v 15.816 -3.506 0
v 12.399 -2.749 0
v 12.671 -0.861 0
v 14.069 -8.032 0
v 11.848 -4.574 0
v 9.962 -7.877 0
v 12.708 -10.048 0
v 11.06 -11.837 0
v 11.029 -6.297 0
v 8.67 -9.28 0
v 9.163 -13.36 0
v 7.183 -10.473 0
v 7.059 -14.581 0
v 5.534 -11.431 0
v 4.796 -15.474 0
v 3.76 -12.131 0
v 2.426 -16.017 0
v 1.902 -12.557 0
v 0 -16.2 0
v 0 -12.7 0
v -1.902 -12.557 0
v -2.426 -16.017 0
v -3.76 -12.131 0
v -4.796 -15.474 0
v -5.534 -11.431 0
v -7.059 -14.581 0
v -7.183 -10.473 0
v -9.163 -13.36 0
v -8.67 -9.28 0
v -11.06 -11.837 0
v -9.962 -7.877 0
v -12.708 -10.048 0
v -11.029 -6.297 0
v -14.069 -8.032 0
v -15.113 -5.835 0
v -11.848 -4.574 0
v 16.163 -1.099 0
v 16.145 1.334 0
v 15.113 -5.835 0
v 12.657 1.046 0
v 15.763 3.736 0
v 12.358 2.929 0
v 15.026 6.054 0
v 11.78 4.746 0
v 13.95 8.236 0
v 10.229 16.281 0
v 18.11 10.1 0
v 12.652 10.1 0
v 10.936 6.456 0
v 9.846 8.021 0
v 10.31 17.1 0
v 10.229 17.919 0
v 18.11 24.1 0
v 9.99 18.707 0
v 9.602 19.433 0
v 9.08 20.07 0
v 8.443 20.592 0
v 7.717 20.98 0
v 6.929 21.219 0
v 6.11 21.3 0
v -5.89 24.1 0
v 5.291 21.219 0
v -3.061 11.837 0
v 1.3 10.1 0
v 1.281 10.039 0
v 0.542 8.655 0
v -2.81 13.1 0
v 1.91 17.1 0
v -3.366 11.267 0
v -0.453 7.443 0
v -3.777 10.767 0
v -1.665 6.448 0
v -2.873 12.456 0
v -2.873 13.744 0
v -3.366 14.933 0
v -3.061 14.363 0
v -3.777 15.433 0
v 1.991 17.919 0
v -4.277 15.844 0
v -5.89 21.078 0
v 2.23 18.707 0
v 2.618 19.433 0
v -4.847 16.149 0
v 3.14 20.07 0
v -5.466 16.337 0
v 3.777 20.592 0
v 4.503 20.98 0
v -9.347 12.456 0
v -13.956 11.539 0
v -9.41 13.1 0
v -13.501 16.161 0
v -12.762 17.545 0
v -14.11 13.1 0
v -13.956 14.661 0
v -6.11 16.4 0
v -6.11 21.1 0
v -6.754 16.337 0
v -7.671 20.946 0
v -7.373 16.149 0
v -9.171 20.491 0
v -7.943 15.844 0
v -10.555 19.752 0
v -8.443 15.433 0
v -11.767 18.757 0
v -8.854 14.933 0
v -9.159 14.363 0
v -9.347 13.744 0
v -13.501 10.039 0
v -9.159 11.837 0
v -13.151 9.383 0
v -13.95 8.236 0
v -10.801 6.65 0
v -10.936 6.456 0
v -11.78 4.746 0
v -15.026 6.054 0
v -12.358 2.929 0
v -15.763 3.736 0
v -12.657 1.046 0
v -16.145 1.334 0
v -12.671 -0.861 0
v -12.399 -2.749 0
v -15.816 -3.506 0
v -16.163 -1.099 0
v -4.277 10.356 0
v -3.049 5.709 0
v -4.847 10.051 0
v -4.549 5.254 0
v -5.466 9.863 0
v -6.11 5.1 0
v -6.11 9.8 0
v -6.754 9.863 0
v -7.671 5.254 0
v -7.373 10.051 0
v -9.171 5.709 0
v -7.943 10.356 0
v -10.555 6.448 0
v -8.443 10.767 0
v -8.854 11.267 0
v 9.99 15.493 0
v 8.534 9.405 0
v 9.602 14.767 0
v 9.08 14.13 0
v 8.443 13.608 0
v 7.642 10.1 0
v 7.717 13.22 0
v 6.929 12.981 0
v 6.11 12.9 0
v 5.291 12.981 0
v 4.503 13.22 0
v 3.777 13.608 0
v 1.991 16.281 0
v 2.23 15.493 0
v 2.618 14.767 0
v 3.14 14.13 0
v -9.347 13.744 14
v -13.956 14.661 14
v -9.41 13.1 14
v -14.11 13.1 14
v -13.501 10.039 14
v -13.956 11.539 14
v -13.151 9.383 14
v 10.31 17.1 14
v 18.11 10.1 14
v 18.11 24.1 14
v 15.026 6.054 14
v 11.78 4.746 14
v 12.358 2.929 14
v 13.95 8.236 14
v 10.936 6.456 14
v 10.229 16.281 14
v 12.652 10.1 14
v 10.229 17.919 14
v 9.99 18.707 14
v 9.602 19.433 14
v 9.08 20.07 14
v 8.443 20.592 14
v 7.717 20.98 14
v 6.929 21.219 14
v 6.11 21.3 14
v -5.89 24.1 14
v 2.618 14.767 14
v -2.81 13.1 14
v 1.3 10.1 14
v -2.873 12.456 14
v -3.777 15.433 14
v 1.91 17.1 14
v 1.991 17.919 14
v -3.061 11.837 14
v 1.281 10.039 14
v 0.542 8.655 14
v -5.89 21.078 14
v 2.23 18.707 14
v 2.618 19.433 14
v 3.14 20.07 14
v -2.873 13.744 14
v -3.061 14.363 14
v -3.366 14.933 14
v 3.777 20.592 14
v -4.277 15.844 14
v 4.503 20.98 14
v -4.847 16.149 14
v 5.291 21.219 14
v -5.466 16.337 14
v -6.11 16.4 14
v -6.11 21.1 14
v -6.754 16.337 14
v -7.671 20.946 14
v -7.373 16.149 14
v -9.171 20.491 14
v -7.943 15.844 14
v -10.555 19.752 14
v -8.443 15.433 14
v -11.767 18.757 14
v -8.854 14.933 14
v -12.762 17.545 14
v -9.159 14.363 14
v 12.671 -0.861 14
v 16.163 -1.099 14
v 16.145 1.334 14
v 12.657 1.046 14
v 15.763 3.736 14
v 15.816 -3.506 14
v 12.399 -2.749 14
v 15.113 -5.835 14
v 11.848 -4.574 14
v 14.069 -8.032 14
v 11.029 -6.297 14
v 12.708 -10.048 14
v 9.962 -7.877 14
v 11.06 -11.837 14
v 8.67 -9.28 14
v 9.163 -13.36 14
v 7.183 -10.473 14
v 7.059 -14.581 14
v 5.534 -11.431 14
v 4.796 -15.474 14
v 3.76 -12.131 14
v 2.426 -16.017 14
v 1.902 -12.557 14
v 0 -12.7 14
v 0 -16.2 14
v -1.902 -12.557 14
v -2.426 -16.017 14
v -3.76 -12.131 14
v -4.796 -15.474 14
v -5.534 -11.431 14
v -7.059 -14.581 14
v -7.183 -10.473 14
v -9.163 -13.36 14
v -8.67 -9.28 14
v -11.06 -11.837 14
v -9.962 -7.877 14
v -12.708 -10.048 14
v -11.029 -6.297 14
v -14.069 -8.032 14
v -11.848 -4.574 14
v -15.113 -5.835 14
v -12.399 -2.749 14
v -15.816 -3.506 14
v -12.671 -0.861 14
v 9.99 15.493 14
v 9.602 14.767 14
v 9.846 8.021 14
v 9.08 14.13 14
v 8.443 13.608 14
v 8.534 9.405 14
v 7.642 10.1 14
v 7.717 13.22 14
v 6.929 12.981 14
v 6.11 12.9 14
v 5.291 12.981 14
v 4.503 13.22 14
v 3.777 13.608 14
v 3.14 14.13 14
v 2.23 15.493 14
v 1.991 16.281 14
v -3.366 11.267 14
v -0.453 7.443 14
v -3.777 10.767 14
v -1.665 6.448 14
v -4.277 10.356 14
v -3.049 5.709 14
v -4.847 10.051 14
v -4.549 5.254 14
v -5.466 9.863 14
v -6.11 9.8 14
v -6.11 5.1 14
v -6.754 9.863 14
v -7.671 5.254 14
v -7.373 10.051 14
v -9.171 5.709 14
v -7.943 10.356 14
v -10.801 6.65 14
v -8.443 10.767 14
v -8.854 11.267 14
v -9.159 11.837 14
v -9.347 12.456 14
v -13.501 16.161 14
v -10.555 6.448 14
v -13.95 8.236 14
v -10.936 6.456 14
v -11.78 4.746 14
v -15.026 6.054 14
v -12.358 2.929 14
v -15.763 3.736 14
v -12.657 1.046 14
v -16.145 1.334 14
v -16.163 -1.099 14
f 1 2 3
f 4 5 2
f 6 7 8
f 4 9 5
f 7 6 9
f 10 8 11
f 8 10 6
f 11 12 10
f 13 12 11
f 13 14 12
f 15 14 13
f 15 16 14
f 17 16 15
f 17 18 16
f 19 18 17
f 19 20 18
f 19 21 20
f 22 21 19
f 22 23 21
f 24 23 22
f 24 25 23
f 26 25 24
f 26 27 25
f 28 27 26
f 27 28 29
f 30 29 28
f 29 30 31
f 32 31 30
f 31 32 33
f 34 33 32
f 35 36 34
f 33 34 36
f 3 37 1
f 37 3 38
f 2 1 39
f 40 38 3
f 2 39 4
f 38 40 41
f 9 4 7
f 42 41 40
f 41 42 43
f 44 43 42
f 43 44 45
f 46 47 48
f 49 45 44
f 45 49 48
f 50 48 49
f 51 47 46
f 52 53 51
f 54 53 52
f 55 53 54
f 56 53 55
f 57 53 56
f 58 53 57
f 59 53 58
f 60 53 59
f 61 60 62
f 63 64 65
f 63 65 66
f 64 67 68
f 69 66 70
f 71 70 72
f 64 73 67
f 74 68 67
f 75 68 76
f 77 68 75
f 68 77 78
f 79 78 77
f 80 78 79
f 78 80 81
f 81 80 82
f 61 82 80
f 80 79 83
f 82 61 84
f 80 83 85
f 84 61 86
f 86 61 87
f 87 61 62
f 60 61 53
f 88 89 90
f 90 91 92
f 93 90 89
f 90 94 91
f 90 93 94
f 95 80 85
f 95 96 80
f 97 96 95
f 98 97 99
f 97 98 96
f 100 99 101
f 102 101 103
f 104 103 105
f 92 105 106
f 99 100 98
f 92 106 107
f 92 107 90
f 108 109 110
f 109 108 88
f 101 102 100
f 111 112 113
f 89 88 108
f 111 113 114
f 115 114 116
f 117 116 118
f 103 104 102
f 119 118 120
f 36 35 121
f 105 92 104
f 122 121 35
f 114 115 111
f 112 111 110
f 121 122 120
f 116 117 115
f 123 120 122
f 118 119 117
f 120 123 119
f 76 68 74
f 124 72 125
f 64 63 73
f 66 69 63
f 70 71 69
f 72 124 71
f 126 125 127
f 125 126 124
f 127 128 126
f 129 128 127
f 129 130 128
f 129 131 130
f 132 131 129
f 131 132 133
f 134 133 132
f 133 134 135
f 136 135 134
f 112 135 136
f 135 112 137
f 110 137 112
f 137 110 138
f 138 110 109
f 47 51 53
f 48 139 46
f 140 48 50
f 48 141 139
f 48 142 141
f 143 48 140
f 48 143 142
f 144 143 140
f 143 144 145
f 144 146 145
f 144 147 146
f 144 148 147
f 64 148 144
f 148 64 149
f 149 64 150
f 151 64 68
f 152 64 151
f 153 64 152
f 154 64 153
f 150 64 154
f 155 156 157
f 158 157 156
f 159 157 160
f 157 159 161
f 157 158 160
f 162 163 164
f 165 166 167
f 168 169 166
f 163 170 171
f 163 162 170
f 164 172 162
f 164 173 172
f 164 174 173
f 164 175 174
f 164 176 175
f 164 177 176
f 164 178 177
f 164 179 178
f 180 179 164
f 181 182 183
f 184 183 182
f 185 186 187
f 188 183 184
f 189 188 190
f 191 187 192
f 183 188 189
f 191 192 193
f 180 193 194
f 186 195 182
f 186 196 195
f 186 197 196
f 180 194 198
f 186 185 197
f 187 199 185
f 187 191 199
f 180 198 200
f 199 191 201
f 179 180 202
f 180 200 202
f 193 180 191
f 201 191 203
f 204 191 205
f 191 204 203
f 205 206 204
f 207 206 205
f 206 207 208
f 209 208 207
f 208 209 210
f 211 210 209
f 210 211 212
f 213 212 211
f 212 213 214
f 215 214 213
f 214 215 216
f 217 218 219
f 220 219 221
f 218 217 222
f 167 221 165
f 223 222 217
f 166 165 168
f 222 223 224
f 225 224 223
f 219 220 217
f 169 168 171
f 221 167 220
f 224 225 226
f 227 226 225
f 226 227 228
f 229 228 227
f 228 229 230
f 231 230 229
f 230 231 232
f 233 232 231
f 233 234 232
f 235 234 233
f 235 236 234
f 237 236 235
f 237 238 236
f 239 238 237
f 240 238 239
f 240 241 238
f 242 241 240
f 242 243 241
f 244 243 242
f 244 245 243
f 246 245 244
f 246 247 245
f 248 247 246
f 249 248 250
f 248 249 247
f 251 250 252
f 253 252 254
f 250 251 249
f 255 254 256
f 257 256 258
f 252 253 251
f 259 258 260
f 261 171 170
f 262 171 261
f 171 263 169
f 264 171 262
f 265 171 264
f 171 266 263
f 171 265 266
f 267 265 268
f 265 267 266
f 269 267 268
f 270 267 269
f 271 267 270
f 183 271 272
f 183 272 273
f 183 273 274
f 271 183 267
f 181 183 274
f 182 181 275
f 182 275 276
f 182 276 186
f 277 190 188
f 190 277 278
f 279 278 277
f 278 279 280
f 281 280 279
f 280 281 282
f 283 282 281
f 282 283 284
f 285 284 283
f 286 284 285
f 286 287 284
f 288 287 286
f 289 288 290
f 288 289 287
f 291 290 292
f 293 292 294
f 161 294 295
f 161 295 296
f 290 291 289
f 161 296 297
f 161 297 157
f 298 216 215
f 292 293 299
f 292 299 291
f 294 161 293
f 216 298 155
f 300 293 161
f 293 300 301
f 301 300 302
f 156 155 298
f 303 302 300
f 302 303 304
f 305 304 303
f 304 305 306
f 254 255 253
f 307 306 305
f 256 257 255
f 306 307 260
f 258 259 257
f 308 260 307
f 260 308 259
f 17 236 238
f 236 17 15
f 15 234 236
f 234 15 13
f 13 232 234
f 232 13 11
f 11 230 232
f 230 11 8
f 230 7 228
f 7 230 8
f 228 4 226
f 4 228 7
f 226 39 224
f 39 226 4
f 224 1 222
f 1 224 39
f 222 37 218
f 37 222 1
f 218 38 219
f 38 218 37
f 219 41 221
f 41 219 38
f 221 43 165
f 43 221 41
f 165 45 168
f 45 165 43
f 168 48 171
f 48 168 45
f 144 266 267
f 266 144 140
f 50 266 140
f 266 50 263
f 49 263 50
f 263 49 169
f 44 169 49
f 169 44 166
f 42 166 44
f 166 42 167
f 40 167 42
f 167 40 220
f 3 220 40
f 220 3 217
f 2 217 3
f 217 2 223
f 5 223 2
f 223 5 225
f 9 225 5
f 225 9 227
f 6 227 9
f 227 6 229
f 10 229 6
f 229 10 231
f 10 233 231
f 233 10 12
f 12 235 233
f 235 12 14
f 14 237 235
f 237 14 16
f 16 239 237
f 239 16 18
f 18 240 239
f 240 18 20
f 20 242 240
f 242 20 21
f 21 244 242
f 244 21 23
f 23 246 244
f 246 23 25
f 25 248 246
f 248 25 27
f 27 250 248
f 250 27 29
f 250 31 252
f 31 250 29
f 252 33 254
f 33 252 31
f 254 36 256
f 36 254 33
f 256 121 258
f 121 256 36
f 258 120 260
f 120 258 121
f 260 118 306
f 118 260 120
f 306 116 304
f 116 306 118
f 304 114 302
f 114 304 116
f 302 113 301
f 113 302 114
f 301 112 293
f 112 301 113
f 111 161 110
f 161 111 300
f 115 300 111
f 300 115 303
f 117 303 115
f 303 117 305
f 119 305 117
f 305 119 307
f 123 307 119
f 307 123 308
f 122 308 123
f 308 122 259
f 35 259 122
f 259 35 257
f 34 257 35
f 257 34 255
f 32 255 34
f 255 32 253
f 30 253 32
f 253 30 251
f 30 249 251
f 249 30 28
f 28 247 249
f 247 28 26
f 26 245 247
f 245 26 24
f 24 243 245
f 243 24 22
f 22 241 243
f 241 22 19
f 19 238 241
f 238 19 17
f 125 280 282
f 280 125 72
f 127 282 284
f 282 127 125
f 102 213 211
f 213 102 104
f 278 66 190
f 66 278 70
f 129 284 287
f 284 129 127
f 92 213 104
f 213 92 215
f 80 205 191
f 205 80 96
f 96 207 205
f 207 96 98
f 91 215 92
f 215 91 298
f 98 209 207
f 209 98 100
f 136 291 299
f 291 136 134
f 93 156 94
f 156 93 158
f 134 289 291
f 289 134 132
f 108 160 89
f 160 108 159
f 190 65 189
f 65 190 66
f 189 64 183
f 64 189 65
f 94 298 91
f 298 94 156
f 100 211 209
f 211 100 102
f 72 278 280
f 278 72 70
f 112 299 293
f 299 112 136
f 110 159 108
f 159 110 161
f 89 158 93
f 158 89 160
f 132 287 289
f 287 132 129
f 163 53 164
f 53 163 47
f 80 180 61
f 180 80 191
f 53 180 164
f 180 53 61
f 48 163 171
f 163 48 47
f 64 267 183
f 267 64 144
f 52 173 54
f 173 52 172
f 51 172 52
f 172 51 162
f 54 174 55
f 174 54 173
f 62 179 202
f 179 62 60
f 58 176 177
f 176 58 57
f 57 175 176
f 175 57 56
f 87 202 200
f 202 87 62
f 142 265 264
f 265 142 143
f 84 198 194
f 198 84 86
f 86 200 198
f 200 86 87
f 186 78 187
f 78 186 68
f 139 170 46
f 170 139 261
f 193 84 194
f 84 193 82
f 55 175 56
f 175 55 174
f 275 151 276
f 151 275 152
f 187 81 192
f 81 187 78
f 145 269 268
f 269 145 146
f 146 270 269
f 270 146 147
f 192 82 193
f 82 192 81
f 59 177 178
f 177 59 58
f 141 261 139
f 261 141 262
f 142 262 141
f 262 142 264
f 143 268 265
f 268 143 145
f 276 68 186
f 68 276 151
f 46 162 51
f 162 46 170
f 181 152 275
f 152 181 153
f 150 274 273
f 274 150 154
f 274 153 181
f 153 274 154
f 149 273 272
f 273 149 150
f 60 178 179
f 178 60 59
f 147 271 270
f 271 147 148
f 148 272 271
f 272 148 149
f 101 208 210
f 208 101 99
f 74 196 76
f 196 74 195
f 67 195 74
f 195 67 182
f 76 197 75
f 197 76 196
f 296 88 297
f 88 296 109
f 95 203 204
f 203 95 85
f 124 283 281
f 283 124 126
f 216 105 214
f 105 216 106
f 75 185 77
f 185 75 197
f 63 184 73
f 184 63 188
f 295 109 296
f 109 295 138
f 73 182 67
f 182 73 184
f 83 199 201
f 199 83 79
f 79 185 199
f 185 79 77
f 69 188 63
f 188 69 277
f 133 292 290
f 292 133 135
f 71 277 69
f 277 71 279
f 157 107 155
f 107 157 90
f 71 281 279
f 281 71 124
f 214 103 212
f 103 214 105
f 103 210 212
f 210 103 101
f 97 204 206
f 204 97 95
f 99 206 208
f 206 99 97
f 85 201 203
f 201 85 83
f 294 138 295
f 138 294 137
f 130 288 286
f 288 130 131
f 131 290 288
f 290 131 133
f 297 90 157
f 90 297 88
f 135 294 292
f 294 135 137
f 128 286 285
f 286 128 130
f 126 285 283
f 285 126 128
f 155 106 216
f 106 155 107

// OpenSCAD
$fn = 32;

// ----------------------------------------------------------------------
// Pipe clamp: 32.4 mm ring, 3.5 mm wall, 14 mm wide
// ----------------------------------------------------------------------

// --- parameters (mm) ---
outer_r = 16.2;           // clamp outside radius
inner_r = 12.7;           // pipe bore radius
band = 3.5;               // band thickness
clamp_w = 14;             // clamp width
opening = 50;             // opening angle between the ends
lug_w = 24;               // lug width
lug_len = 14;             // lug length
bolt_d = 8.4;             // bolt hole
knuckle_d = 16;           // hinge knuckle diameter
pin_d = 6.6;              // hinge pin hole

clamp_profile = [[-6.846, 14.682], [-8.968, 13.492], [-10.887, 11.997], [-12.56, 10.232], [-13.95, 8.236], [-15.026, 6.054], [-15.763, 3.736], [-16.145, 1.334], [-16.163, -1.099], [-15.816, -3.506], [-15.113, -5.835], [-14.069, -8.032], [-12.708, -10.048], [-11.06, -11.837], [-9.163, -13.36], [-7.059, -14.581], [-4.796, -15.474], [-2.426, -16.017], [0, -16.2], [2.426, -16.017], [4.796, -15.474], [7.059, -14.581], [9.163, -13.36], [11.06, -11.837], [12.708, -10.048], [14.069, -8.032], [15.113, -5.835], [15.816, -3.506], [16.163, -1.099], [16.145, 1.334], [15.763, 3.736], [15.026, 6.054], [13.95, 8.236], [12.56, 10.232], [10.887, 11.997], [8.968, 13.492], [6.846, 14.682], [5.367, 11.51], [7.03, 10.577], [8.534, 9.405], [9.846, 8.021], [10.936, 6.456], [11.78, 4.746], [12.358, 2.929], [12.657, 1.046], [12.671, -0.861], [12.399, -2.749], [11.848, -4.574], [11.029, -6.297], [9.962, -7.877], [8.67, -9.28], [7.183, -10.473], [5.534, -11.431], [3.76, -12.131], [1.902, -12.557], [0, -12.7], [-1.902, -12.557], [-3.76, -12.131], [-5.534, -11.431], [-7.183, -10.473], [-8.67, -9.28], [-9.962, -7.877], [-11.029, -6.297], [-11.848, -4.574], [-12.399, -2.749], [-12.671, -0.861], [-12.657, 1.046], [-12.358, 2.929], [-11.78, 4.746], [-10.936, 6.456], [-9.846, 8.021], [-8.534, 9.405], [-7.03, 10.577], [-5.367, 11.51]];

difference() {
  union() {
    linear_extrude(height = clamp_w) polygon(clamp_profile);
    /* hinge knuckle, sunk 2 mm into the band end */
    translate([-6.11, 13.1, 0]) cylinder(h = clamp_w, d = knuckle_d);
    /* bolt lug on the other end */
    translate([-5.89, 10.1, 0]) cube([lug_w, 14, clamp_w]);
  }
  translate([6.11, 17.1, -2.5]) cylinder(h = clamp_w + 5, d = bolt_d);
  translate([-6.11, 13.1, -2.5]) cylinder(h = clamp_w + 5, d = pin_d);
}
